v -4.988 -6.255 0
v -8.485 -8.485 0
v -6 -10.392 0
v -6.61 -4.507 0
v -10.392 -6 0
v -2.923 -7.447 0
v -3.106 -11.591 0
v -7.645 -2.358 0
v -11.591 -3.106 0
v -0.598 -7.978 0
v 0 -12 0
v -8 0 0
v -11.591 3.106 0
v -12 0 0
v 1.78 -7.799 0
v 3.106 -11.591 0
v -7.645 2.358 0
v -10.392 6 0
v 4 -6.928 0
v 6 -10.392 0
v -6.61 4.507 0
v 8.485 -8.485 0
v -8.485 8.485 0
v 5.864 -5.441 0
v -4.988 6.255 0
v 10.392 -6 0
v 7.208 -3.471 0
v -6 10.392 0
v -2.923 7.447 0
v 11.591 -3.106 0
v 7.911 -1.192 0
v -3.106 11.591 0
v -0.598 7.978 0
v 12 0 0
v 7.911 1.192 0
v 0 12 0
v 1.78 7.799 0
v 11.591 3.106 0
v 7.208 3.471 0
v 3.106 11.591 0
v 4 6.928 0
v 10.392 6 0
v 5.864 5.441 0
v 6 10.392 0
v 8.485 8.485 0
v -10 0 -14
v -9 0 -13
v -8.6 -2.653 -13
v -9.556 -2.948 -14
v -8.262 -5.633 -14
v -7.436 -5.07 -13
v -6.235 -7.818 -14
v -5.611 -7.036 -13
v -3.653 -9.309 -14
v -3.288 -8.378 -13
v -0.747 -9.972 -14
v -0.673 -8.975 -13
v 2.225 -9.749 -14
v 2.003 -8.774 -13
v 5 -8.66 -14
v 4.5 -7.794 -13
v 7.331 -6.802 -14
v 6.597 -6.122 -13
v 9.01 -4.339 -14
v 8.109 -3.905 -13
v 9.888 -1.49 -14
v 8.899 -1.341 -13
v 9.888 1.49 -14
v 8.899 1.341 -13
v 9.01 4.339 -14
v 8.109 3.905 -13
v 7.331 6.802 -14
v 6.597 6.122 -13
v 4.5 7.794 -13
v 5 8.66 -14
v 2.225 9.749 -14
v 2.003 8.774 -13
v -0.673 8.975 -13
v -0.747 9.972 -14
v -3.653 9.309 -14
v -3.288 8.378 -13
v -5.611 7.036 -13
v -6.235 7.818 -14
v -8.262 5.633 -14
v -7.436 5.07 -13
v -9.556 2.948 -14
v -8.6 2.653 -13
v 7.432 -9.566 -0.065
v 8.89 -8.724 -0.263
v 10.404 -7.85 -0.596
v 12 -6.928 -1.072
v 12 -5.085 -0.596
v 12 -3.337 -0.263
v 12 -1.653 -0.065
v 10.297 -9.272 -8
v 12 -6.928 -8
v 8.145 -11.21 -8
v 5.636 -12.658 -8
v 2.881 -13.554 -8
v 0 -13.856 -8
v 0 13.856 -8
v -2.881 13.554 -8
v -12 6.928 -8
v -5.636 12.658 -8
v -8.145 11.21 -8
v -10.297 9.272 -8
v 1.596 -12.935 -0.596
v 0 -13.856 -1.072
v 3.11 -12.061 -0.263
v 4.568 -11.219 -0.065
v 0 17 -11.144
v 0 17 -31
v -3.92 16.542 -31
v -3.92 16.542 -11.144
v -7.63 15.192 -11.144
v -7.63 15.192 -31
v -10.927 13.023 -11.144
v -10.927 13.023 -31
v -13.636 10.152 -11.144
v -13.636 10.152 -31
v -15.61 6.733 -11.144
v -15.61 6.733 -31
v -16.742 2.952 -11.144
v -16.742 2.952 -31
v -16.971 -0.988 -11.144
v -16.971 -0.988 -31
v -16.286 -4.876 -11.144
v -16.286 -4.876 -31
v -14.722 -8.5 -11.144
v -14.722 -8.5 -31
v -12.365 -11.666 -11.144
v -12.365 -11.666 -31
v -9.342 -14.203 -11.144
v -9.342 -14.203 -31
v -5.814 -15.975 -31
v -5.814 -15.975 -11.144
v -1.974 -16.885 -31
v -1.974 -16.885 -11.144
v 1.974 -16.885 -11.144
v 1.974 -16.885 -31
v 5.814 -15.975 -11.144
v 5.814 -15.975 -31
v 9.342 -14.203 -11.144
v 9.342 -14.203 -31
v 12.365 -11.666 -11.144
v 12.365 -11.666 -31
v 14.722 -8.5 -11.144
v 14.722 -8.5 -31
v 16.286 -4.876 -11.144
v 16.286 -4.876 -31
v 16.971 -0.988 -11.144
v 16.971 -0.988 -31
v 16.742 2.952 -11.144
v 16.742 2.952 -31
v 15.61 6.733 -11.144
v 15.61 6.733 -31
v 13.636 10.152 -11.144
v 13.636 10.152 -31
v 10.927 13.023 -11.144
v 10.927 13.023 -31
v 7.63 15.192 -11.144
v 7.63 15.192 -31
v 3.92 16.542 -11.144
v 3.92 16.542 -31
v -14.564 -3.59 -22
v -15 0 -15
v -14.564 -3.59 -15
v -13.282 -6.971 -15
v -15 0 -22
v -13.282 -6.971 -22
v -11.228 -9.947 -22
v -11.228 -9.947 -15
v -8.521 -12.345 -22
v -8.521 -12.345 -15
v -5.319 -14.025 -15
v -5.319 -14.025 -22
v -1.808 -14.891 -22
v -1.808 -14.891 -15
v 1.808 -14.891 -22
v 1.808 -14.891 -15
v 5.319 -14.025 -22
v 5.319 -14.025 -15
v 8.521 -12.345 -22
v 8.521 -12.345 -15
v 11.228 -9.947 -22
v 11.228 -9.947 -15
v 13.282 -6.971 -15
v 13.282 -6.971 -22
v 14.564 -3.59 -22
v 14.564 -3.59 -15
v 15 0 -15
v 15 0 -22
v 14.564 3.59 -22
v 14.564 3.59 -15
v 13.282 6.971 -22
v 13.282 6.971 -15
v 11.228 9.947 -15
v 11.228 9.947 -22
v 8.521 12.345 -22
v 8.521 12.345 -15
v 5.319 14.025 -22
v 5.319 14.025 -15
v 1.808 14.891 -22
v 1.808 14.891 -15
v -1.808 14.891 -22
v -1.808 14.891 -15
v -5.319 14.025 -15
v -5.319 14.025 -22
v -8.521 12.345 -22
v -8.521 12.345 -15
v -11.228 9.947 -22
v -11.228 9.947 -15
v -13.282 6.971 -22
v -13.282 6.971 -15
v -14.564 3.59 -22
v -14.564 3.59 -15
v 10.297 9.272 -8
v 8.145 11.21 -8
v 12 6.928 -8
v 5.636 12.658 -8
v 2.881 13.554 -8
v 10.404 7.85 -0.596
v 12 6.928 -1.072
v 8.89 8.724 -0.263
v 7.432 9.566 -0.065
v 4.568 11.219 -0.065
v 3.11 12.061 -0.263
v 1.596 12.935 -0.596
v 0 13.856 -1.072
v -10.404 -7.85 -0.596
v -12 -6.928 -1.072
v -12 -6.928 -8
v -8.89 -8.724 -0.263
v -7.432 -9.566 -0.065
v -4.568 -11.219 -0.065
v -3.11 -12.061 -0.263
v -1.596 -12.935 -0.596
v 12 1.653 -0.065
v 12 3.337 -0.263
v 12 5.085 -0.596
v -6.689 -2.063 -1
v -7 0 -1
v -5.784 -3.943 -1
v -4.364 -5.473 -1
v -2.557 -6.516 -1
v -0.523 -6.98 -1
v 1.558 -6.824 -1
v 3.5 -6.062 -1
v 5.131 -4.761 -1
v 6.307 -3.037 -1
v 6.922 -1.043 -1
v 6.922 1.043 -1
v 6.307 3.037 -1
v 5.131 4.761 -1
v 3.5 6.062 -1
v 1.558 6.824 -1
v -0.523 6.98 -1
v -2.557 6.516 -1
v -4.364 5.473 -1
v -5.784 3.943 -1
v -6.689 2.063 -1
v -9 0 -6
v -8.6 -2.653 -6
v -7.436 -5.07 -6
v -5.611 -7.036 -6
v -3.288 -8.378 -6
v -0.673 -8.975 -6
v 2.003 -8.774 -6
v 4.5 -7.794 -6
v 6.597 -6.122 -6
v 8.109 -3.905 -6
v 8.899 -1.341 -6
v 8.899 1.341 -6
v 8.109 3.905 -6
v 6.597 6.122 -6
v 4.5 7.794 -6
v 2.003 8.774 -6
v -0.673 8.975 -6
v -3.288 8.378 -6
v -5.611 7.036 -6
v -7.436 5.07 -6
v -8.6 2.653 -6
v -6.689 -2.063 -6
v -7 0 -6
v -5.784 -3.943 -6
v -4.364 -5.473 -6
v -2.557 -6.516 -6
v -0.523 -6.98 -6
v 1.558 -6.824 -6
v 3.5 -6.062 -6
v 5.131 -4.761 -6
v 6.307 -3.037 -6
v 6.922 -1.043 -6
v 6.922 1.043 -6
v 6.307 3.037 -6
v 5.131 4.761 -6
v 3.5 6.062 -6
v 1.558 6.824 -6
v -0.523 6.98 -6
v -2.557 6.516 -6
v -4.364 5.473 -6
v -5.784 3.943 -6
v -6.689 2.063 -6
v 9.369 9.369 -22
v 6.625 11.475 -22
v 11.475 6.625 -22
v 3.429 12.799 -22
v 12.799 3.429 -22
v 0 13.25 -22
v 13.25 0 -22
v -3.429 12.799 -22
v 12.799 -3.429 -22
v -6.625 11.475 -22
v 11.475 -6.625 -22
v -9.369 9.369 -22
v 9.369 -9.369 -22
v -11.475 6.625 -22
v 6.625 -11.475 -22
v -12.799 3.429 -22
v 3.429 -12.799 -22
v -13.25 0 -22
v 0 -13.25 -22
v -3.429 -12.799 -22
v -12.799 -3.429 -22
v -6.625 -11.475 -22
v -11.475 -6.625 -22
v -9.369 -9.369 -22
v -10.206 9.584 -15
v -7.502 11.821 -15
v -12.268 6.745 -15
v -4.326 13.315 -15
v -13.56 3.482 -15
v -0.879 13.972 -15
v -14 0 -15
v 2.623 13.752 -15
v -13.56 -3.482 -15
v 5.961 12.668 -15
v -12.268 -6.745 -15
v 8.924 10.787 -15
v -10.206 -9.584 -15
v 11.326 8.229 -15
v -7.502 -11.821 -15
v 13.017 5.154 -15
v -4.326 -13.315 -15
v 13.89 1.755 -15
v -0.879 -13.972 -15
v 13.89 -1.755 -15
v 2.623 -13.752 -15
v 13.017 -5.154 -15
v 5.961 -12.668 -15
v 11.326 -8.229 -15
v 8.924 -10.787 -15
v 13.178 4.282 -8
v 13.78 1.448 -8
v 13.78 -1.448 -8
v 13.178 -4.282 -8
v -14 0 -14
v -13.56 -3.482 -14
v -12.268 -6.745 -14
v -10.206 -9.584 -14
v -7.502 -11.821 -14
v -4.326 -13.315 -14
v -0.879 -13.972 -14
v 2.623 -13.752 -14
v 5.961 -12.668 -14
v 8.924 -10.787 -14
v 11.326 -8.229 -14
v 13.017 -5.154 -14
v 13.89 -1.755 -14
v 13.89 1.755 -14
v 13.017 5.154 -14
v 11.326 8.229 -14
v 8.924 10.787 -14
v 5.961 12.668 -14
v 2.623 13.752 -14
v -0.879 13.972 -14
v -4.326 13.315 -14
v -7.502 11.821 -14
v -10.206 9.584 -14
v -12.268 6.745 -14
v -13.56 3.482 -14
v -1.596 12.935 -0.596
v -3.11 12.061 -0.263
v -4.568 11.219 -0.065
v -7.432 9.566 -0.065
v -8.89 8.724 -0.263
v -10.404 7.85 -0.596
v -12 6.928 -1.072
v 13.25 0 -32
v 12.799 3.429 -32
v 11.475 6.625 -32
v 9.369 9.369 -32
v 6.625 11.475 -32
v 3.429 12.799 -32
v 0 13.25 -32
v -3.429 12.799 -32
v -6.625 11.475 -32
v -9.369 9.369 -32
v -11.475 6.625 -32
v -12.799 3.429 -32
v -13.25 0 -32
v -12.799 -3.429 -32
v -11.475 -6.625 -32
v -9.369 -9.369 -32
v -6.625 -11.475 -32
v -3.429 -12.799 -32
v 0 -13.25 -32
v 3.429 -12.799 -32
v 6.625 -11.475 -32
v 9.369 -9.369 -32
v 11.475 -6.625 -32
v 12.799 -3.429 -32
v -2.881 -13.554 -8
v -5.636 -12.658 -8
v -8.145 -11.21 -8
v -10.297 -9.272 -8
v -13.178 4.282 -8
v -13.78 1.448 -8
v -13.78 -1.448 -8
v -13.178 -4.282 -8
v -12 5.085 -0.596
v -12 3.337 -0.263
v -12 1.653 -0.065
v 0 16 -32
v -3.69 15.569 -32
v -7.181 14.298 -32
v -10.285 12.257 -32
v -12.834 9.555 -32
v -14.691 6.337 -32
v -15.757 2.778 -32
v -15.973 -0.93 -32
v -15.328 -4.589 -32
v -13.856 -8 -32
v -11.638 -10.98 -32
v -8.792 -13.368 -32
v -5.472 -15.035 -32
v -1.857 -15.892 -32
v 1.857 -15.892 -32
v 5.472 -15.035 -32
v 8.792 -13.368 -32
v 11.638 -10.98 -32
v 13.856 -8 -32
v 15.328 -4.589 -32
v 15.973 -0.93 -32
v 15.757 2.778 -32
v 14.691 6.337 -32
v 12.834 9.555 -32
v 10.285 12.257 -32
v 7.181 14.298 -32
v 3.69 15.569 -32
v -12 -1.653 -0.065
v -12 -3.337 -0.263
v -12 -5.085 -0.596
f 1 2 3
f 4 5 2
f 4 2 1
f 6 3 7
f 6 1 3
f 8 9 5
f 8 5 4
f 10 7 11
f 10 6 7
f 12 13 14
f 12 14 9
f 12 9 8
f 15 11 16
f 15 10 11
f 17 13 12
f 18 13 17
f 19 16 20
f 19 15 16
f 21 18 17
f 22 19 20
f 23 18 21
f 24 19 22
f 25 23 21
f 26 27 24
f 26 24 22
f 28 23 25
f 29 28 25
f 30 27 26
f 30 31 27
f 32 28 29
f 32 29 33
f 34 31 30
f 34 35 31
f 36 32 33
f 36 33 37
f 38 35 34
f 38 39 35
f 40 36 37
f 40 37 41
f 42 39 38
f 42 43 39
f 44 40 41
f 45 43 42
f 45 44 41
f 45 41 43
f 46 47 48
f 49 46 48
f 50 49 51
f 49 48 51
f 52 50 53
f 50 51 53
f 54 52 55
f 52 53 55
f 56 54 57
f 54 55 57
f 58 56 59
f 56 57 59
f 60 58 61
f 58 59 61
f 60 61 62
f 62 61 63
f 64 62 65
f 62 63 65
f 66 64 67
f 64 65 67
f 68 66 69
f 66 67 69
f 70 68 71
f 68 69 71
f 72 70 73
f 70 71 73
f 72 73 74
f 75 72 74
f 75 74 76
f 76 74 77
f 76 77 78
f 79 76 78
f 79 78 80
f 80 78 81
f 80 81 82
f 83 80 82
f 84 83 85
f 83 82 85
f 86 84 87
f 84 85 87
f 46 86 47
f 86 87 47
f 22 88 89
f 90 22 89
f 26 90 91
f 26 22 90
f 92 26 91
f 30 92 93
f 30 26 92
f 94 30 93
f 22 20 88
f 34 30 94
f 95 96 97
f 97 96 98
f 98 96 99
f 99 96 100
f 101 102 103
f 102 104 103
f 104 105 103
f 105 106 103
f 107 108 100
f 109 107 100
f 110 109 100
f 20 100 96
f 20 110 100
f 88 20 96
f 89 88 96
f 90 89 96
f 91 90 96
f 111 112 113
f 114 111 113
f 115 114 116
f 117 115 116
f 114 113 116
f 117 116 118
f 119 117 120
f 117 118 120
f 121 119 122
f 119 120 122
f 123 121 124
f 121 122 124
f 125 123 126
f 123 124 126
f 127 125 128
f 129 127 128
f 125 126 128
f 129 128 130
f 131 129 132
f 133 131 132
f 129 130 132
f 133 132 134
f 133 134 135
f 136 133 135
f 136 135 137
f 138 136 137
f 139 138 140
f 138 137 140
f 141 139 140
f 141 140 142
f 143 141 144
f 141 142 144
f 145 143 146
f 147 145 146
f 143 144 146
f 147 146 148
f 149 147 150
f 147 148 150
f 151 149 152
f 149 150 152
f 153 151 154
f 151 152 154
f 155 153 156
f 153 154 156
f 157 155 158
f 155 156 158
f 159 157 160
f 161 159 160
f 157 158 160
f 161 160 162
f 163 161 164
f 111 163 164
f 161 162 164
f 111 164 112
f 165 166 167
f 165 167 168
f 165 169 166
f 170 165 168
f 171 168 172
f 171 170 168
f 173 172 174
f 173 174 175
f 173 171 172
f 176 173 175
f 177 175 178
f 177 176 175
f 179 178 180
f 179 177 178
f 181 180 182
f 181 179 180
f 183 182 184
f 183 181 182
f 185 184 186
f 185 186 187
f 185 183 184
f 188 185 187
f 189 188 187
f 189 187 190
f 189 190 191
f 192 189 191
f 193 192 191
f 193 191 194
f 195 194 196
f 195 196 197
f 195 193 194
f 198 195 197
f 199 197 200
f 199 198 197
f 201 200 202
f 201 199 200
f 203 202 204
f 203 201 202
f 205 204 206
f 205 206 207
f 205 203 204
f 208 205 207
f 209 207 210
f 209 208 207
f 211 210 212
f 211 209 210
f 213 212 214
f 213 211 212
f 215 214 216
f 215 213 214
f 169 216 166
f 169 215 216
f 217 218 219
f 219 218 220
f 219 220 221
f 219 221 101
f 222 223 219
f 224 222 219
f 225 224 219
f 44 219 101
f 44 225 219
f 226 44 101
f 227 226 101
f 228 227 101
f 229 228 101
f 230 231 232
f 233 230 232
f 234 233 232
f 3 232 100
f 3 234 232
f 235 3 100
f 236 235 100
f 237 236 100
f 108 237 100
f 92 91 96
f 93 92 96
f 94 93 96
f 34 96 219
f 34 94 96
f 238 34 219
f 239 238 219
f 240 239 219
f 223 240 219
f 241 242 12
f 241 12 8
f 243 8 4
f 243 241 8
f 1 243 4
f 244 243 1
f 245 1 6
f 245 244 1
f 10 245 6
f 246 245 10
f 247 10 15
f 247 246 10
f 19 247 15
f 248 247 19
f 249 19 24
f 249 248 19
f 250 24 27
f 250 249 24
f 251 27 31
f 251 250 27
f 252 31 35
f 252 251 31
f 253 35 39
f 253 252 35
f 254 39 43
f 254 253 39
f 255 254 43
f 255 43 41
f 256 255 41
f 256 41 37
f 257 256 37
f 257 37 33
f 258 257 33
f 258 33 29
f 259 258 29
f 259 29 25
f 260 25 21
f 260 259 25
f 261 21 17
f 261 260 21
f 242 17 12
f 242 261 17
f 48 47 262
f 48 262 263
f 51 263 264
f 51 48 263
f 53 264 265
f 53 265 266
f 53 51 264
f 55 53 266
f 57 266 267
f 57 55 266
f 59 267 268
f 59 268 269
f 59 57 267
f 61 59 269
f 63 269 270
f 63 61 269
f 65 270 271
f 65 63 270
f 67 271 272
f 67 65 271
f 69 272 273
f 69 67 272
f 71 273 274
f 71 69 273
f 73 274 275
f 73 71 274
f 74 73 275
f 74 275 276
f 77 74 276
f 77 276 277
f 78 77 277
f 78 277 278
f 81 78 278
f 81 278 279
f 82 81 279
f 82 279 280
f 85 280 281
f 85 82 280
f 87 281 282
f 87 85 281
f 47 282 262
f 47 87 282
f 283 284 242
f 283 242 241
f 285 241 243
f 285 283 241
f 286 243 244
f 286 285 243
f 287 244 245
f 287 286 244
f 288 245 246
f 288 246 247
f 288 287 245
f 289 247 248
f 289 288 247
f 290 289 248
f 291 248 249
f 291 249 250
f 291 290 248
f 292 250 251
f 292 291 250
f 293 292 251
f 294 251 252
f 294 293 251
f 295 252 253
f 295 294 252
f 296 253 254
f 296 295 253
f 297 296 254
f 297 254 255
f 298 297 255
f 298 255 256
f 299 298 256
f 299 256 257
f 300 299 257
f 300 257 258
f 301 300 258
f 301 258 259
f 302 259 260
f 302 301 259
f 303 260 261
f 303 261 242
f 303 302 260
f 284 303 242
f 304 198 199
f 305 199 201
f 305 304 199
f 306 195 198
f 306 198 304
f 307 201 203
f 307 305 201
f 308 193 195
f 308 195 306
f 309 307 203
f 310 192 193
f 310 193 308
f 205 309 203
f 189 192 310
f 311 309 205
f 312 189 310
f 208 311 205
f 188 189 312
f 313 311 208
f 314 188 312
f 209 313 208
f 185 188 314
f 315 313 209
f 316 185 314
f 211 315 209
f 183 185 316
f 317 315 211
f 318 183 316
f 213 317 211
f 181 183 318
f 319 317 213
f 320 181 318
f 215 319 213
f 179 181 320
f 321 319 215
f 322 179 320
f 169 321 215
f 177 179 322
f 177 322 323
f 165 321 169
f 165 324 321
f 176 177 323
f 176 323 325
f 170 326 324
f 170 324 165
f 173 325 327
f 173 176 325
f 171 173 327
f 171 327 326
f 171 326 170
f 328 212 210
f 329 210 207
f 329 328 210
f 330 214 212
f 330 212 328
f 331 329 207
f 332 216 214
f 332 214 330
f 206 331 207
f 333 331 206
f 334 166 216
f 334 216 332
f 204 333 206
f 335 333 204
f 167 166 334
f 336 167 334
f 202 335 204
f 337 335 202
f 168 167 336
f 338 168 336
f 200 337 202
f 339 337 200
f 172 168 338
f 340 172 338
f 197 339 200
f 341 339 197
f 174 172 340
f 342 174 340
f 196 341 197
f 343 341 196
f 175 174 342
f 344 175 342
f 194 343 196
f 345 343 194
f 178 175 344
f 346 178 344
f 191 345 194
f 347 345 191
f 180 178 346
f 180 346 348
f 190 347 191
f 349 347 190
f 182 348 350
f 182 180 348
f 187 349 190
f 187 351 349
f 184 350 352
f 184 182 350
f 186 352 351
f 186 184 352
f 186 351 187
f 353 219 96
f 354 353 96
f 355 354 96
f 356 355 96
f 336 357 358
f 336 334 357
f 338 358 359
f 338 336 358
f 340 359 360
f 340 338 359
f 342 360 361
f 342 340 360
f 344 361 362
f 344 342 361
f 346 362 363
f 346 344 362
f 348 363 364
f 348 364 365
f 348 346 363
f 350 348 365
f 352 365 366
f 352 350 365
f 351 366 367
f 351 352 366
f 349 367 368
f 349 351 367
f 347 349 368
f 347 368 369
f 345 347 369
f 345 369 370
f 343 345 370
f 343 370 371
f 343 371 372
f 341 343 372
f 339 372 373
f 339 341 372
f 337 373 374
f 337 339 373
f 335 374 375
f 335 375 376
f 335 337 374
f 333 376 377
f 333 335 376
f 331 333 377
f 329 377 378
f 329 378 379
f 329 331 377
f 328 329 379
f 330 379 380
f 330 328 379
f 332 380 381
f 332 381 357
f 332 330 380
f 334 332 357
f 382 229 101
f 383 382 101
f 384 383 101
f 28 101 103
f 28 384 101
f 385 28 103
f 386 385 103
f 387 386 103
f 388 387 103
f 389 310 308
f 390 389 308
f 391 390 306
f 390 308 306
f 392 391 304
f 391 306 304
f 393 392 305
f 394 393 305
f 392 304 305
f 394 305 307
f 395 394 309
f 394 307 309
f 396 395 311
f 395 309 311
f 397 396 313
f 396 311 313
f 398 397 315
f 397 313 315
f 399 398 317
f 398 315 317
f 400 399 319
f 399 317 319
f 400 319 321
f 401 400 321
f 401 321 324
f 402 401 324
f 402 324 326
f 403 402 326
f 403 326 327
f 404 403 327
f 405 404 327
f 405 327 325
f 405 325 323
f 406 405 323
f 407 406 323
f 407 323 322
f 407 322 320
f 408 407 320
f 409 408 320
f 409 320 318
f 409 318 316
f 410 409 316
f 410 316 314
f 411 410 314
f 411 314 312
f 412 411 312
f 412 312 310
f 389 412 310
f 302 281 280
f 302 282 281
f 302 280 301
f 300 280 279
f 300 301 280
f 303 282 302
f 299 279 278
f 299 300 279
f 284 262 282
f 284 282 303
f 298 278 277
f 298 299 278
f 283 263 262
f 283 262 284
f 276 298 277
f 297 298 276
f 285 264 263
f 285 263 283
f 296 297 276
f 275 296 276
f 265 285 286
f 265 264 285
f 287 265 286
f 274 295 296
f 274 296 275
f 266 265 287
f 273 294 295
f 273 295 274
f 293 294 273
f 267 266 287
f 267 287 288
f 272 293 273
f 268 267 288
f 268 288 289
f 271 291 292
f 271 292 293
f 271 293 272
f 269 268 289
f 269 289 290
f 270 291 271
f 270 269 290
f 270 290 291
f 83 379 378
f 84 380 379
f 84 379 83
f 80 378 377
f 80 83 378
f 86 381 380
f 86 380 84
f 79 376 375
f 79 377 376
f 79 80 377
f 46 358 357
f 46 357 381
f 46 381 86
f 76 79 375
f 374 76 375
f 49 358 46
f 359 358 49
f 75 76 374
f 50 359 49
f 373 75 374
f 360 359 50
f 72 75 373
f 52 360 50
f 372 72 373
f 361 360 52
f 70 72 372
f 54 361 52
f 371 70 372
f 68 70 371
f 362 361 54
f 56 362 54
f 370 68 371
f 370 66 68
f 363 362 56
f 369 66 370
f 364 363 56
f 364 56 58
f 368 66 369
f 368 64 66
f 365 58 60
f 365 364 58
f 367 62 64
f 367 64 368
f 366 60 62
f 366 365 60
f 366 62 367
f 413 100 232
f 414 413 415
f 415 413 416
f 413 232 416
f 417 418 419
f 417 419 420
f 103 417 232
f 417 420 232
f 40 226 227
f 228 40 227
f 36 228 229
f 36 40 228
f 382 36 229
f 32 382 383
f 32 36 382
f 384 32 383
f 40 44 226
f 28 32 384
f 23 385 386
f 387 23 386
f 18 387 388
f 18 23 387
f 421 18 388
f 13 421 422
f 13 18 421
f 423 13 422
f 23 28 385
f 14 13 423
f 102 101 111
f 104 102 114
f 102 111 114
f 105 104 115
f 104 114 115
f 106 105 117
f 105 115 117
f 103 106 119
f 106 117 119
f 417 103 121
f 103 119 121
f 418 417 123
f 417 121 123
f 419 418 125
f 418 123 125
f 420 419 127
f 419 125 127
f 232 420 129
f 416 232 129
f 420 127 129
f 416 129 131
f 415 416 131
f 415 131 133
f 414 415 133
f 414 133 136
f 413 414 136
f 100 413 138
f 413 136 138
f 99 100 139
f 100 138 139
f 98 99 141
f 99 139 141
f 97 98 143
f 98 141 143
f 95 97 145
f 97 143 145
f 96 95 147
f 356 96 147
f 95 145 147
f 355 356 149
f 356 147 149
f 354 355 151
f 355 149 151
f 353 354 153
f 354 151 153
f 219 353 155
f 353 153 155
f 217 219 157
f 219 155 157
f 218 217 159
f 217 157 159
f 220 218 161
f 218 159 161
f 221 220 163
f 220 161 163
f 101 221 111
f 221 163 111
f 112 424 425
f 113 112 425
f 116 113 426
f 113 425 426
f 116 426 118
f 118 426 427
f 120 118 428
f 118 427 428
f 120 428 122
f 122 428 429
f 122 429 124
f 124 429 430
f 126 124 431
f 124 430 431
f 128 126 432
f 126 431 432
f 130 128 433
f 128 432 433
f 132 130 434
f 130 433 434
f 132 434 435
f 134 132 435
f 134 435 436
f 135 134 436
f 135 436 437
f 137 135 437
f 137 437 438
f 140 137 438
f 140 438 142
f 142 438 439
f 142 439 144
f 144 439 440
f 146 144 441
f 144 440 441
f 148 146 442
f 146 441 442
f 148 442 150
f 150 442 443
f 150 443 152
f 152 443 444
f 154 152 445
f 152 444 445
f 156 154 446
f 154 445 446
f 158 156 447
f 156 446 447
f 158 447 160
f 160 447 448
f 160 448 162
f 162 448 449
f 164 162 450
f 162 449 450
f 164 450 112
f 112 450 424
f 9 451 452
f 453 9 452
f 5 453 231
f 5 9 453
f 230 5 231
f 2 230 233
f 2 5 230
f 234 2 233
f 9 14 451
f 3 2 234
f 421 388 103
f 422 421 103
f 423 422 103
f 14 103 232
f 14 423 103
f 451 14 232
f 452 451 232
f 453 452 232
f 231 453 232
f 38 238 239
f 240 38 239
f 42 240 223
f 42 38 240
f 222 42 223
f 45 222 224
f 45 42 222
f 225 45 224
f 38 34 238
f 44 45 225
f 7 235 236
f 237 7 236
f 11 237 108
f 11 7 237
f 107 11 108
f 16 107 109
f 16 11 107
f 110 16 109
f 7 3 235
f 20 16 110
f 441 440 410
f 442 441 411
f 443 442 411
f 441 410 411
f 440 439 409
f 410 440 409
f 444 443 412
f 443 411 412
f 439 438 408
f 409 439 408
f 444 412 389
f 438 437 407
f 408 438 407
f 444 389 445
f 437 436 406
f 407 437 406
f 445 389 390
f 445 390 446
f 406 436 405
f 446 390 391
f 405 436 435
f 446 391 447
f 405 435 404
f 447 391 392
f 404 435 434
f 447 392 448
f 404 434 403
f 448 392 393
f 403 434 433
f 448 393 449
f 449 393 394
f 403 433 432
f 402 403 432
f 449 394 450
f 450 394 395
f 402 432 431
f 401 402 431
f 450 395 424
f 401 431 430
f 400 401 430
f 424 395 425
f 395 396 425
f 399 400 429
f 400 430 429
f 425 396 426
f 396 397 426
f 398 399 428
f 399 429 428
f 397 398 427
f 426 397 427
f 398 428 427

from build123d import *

# Parameters (mm, degrees)
EXTRUDE_1_DEPTH         = 8
SKETCH_3_OUTSIDE_W      = 189.666
SKETCH_3_OUTSIDE_H      = 189.666
SKETCH_3_OUTSIDE_R      = 12
CUT_EXTRUDE_1_DEPTH     = 41.024992192
CUT_EXTRUDE_1_DRAFT     = -60
HOLE_WIZARD_M30_1_D     = 26.5
HOLE_WIZARD_M30_1_DEPTH = 10
CHAMFER_1_SIZE          = 1
CHAMFER_2_SIZE          = 1


with BuildPart() as part:
    # 草图1 → 凸台-拉伸1 (new body)
    with BuildSketch(Plane.XY):
        Polygon((0, 13.856406461), (-12, 6.92820323), (-12, -6.92820323), (0, -13.856406461), (12, -6.92820323), (12, 6.92820323), align=None)
    extrude(amount=-EXTRUDE_1_DEPTH)

    # 草图2 → 旋转1 (revolve)
    with BuildSketch(Plane(origin=(0, 0, 0), x_dir=(0, 0, -1), z_dir=(1, 0, 0))):
        Polygon((8, 0), (8, 13.856406461), (11.143593539, 17), (32, 17), (32, 0), align=None)
    revolve(axis=Axis((0, 0, -32), (0, 0, 1)))


with BuildPart() as cut_extrude_1_tool:
    # 草图3 outside → 切除-拉伸1 (with draft: the straight prism first)
    with BuildSketch(Plane.XY):
        Rectangle(SKETCH_3_OUTSIDE_W, SKETCH_3_OUTSIDE_H)
        Circle(SKETCH_3_OUTSIDE_R, mode=Mode.SUBTRACT)
    extrude(amount=-CUT_EXTRUDE_1_DEPTH)
    # 切除-拉伸1: the draft: its side faces are tilted about the plane it starts from
    cut_extrude_1_sides = [cut_extrude_1_tool.faces().sort_by_distance(p)[0] for p in [
        (0, -94.833, -20.512496096),
        (94.833, 0, -20.512496096),
        (0, 94.833, -20.512496096),
        (-94.833, 0, -20.512496096),
        (-12, 0, -20.512496096),
    ]]
    draft(cut_extrude_1_sides, Plane.XY, CUT_EXTRUDE_1_DRAFT)


with BuildPart() as part_1:
    add(part.part)

    # 切除-拉伸1: cut by cut_extrude_1_tool
    add(cut_extrude_1_tool.part, mode=Mode.SUBTRACT)

    # 草图4 → 切除-旋转1 (revolve, cut)
    with BuildSketch(Plane(origin=(0, 0, 0), x_dir=(0, 0, -1), z_dir=(1, 0, 0)), mode=Mode.PRIVATE) as cut_revolve_1_sk:
        Polygon((0, 0), (0, -7), (6, -7), (6, -9), (14, -9), (14, -14), (15, -14), (15, -15), (22, -15), (22, 0), align=None)
    revolve(cut_revolve_1_sk.sketch.rotate(Axis((0, 0, -22), (0, 0, 1)), 270), axis=Axis((0, 0, -22), (0, 0, 1)), mode=Mode.SUBTRACT)

    # M30 螺纹孔1
    with Locations(Plane(origin=(0, 0, -32), x_dir=(-1, 0, 0), z_dir=(0, 0, -1))):
        with Locations((0, 0)):
            Hole(HOLE_WIZARD_M30_1_D / 2, depth=HOLE_WIZARD_M30_1_DEPTH)

    # 倒角1
    chamfer_1_edges = [part_1.edges().sort_by_distance(p)[0] for p in [
        (0, -17, -32),
    ]]
    chamfer(chamfer_1_edges, length=CHAMFER_1_SIZE)

    # 倒角2
    chamfer_2_edges = [part_1.edges().sort_by_distance(p)[0] for p in [
        (7, 0, 0),
        (9, 0, -14),
    ]]
    chamfer(chamfer_2_edges, length=CHAMFER_2_SIZE)


solid = part_1.part
